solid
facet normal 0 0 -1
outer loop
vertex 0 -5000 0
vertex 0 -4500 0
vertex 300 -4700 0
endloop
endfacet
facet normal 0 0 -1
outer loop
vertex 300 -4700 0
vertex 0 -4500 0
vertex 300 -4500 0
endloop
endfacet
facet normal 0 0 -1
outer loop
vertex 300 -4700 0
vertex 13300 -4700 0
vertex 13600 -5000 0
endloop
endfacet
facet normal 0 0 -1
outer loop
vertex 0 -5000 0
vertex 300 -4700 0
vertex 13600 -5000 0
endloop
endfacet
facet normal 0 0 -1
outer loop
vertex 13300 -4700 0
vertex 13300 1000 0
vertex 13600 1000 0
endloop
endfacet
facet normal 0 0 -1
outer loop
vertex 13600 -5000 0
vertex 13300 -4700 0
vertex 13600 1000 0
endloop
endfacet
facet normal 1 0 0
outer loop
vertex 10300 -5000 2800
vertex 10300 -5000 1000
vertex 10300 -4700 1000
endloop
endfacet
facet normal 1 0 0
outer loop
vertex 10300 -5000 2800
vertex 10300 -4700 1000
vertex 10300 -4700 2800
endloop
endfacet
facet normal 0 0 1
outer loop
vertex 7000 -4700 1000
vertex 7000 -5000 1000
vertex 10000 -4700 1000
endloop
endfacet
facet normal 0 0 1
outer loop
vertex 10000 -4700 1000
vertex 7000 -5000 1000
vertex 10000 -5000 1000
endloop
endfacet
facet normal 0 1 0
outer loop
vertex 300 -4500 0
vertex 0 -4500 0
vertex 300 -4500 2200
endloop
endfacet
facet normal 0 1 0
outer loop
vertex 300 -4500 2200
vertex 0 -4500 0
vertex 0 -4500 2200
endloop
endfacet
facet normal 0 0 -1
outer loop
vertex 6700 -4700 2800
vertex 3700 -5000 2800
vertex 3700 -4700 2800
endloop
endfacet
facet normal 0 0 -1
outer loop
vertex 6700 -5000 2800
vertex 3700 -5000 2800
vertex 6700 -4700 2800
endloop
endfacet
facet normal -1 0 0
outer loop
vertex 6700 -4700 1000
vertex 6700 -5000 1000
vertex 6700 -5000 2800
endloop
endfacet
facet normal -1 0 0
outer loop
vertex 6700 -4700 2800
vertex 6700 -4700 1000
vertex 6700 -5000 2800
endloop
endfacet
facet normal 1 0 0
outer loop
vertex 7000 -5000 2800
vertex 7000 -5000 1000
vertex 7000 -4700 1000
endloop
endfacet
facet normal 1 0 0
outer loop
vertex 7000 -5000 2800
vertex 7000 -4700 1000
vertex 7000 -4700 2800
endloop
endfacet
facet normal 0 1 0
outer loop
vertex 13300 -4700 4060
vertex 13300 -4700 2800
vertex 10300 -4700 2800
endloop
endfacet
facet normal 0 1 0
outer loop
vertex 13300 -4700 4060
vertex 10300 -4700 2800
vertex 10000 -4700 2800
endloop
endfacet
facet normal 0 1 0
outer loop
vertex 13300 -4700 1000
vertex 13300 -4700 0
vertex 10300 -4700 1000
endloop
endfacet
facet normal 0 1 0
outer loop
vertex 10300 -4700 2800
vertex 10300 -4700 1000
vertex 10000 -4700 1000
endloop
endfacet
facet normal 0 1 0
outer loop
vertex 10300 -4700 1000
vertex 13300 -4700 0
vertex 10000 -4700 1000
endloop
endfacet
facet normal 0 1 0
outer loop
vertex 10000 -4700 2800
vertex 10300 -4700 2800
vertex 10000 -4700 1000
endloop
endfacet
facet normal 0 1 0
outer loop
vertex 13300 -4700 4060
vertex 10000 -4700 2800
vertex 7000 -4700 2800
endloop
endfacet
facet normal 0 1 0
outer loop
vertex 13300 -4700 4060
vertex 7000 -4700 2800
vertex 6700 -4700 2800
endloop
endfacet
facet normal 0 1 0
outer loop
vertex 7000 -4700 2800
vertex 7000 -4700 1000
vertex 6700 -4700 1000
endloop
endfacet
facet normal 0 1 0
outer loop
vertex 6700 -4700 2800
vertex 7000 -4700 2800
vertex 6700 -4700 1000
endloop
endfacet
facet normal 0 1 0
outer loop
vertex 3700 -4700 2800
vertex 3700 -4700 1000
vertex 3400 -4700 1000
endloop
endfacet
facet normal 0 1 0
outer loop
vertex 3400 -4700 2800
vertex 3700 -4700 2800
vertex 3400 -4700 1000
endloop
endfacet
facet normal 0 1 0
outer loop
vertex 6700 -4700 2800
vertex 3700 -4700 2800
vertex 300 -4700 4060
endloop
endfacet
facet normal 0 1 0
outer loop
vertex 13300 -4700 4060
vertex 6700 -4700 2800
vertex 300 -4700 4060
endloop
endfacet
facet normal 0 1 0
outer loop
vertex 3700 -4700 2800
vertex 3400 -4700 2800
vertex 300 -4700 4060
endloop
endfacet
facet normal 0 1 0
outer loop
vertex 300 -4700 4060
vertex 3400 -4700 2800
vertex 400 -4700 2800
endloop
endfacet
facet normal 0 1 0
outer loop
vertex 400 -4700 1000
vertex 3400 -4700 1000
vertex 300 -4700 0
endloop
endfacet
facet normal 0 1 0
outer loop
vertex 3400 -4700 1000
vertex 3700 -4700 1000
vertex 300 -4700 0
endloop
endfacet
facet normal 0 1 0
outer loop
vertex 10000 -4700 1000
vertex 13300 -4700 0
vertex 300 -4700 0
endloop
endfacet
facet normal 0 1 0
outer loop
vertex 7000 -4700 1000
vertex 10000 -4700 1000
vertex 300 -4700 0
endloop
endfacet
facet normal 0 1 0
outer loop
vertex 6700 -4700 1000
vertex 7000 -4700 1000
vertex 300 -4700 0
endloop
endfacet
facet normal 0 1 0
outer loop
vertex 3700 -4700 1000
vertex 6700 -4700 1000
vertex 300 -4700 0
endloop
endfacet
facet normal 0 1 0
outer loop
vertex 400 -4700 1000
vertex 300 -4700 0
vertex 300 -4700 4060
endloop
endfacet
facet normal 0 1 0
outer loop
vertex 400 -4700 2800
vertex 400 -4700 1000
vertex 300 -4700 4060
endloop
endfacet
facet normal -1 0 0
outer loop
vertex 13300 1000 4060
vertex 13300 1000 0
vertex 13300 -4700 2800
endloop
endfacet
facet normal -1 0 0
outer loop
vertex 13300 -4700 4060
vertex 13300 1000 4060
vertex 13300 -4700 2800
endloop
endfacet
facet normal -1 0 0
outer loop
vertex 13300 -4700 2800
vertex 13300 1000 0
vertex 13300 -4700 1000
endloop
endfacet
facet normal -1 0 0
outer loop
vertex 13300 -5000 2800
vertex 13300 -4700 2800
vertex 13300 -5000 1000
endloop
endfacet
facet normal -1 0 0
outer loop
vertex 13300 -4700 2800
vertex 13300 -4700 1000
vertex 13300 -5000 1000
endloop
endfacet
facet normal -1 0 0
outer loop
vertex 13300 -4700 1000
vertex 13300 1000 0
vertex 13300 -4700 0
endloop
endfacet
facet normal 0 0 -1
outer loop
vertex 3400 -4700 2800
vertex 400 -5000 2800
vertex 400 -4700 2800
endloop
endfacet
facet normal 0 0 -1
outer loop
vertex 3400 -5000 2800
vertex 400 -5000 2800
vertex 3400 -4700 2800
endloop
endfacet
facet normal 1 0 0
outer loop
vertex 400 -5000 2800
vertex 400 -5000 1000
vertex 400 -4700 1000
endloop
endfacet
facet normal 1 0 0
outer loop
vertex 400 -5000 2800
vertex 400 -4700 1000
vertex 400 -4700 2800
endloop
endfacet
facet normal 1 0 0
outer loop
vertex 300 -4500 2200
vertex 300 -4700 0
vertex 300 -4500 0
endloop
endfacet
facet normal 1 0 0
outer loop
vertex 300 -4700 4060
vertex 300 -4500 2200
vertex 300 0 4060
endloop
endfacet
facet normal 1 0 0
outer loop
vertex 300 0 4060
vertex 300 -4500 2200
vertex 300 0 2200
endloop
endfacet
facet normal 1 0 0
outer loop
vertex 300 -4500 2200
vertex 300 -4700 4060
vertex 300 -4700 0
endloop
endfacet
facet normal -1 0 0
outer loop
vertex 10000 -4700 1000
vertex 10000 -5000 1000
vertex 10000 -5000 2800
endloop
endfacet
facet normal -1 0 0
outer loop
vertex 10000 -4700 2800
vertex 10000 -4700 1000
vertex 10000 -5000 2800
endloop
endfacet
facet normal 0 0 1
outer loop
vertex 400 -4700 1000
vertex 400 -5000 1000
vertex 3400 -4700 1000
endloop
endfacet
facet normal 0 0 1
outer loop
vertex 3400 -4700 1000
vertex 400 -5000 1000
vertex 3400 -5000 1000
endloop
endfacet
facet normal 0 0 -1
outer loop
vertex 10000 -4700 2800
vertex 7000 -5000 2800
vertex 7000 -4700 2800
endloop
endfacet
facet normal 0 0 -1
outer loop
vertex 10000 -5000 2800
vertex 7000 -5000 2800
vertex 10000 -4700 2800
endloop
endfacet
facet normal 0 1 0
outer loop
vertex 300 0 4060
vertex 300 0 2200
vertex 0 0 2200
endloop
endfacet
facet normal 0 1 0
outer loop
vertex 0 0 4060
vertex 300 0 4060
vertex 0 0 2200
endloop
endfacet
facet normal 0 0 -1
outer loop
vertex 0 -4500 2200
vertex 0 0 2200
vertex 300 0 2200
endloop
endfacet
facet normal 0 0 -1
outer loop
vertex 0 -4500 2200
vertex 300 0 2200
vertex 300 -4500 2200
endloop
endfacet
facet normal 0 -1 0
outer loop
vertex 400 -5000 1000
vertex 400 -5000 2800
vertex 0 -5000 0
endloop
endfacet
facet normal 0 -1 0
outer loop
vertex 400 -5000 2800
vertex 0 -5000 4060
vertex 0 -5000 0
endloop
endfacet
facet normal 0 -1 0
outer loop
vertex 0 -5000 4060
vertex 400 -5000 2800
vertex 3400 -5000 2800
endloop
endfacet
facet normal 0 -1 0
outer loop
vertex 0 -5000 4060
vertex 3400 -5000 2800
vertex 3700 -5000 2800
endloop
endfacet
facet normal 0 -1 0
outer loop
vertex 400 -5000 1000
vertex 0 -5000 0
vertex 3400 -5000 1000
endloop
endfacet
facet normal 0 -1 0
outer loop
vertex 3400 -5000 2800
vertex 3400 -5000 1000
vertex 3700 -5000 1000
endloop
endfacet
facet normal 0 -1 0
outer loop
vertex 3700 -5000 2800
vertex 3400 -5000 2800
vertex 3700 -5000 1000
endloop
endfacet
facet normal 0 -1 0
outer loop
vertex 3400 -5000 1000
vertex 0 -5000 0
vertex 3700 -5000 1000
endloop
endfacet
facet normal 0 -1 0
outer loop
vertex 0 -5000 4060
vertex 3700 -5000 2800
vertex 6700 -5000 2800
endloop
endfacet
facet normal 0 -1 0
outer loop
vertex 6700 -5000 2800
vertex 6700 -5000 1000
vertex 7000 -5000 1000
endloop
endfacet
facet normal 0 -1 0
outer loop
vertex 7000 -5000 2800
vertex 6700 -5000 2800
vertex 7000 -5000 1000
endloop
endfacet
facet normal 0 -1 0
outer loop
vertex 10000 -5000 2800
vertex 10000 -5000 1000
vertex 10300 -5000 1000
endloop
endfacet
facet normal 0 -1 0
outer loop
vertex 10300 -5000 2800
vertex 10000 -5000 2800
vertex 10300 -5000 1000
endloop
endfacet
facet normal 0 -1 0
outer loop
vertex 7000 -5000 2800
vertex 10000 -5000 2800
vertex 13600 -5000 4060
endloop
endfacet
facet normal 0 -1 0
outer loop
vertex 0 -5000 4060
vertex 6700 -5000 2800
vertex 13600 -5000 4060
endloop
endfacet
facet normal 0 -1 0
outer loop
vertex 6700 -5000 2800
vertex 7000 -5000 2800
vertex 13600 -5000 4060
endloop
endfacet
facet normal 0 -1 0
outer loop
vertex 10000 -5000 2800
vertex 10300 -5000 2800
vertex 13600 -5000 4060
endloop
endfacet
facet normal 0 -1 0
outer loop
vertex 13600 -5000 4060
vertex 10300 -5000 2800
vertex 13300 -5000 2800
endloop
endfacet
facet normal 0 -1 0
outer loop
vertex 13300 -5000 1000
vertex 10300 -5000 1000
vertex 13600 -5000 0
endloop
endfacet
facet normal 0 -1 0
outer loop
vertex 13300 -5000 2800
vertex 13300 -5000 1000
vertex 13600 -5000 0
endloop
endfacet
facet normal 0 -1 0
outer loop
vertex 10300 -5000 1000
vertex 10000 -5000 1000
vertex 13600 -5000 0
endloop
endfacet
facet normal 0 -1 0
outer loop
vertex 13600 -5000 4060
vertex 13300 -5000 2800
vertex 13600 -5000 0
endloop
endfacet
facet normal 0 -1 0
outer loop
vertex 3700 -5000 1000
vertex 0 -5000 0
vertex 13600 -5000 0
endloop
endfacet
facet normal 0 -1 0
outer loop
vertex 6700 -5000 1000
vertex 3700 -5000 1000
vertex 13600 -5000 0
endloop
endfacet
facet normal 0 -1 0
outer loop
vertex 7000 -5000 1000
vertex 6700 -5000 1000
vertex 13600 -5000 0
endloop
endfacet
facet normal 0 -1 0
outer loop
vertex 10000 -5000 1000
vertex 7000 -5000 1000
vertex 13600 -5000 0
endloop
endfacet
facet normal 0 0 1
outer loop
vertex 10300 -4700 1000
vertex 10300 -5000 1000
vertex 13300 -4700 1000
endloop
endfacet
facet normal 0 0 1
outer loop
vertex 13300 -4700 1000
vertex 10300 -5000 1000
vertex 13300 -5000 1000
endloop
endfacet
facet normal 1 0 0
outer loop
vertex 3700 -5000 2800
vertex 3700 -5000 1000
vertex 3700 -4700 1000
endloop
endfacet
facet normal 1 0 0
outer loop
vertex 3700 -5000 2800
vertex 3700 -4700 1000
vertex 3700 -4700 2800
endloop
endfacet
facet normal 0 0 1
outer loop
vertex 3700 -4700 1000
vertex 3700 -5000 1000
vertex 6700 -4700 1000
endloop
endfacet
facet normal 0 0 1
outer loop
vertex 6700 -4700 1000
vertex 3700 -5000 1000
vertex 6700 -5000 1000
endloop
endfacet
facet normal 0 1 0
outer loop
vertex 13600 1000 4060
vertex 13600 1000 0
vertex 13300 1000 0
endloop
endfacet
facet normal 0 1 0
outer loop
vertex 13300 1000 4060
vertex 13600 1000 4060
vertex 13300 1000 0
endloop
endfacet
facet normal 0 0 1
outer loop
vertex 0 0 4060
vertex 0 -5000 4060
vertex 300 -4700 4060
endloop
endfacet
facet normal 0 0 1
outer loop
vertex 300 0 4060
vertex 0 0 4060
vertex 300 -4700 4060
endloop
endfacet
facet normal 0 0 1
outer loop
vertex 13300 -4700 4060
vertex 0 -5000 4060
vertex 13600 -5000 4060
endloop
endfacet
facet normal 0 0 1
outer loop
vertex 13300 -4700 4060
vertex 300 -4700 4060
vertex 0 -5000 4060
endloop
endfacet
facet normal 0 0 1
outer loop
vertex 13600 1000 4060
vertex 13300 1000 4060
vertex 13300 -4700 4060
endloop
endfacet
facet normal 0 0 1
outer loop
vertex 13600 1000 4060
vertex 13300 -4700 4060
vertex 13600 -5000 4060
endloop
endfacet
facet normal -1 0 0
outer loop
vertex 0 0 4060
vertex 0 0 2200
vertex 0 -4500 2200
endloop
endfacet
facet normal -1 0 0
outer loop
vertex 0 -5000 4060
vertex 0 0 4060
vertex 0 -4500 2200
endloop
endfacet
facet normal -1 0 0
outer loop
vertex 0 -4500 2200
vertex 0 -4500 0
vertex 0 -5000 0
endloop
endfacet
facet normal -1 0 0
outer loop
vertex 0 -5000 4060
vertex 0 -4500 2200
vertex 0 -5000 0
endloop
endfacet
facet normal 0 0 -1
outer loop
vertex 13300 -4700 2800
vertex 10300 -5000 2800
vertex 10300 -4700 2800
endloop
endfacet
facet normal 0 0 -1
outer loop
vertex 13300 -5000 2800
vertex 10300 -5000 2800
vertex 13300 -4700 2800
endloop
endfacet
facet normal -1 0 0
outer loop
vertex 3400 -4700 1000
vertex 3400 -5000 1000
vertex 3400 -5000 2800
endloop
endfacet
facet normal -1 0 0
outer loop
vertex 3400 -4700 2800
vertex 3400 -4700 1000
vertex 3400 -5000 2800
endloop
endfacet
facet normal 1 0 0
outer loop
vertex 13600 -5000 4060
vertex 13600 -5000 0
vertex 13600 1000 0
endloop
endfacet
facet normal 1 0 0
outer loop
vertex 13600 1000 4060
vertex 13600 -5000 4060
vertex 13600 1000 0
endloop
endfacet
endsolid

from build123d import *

# Parameters (mm, degrees)
F1_DEPTH = 4060
F2_W     = 3000
F2_H     = 1800
F3_DEPTH = 6000.001
F5_W     = 4500
F5_H     = 2200
F6_DEPTH = 500
F7_W     = 3000
F7_H     = 1800
F8_DEPTH = 500


with BuildPart() as f1:
    # F0 (on Top) → F1 (new body)
    with BuildSketch(Plane.XY):
        Polygon((300, 0), (0, 0), (0, -5000), (13600, -5000), (13600, 1000), (13300, 1000), (13300, -4700), (300, -4700), align=None)
    extrude(amount=F1_DEPTH)

    # F2 (on face) → F3 (cut, through all)
    with BuildSketch(Plane.XZ.offset(5000)):
        with Locations((1900, 1900)):
            Rectangle(F2_W, F2_H)
        with Locations((5200, 1900)):
            Rectangle(F2_W, F2_H)
        with Locations((8500, 1900)):
            Rectangle(F2_W, F2_H)
    extrude(amount=-F3_DEPTH, mode=Mode.SUBTRACT)

    # F5 (on face) → F6 (cut)
    with BuildSketch(Plane(origin=(0, 0, 0), x_dir=(0, -1, 0), z_dir=(-1, 0, 0))):
        with Locations((2250, 1100)):
            Rectangle(F5_W, F5_H)
    extrude(amount=-F6_DEPTH, mode=Mode.SUBTRACT)

    # F7 (on face) → F8 (cut)
    with BuildSketch(Plane.XZ.offset(5000)):
        with Locations((11800, 1900)):
            Rectangle(F7_W, F7_H)
    extrude(amount=-F8_DEPTH, mode=Mode.SUBTRACT)


solid = f1.part
